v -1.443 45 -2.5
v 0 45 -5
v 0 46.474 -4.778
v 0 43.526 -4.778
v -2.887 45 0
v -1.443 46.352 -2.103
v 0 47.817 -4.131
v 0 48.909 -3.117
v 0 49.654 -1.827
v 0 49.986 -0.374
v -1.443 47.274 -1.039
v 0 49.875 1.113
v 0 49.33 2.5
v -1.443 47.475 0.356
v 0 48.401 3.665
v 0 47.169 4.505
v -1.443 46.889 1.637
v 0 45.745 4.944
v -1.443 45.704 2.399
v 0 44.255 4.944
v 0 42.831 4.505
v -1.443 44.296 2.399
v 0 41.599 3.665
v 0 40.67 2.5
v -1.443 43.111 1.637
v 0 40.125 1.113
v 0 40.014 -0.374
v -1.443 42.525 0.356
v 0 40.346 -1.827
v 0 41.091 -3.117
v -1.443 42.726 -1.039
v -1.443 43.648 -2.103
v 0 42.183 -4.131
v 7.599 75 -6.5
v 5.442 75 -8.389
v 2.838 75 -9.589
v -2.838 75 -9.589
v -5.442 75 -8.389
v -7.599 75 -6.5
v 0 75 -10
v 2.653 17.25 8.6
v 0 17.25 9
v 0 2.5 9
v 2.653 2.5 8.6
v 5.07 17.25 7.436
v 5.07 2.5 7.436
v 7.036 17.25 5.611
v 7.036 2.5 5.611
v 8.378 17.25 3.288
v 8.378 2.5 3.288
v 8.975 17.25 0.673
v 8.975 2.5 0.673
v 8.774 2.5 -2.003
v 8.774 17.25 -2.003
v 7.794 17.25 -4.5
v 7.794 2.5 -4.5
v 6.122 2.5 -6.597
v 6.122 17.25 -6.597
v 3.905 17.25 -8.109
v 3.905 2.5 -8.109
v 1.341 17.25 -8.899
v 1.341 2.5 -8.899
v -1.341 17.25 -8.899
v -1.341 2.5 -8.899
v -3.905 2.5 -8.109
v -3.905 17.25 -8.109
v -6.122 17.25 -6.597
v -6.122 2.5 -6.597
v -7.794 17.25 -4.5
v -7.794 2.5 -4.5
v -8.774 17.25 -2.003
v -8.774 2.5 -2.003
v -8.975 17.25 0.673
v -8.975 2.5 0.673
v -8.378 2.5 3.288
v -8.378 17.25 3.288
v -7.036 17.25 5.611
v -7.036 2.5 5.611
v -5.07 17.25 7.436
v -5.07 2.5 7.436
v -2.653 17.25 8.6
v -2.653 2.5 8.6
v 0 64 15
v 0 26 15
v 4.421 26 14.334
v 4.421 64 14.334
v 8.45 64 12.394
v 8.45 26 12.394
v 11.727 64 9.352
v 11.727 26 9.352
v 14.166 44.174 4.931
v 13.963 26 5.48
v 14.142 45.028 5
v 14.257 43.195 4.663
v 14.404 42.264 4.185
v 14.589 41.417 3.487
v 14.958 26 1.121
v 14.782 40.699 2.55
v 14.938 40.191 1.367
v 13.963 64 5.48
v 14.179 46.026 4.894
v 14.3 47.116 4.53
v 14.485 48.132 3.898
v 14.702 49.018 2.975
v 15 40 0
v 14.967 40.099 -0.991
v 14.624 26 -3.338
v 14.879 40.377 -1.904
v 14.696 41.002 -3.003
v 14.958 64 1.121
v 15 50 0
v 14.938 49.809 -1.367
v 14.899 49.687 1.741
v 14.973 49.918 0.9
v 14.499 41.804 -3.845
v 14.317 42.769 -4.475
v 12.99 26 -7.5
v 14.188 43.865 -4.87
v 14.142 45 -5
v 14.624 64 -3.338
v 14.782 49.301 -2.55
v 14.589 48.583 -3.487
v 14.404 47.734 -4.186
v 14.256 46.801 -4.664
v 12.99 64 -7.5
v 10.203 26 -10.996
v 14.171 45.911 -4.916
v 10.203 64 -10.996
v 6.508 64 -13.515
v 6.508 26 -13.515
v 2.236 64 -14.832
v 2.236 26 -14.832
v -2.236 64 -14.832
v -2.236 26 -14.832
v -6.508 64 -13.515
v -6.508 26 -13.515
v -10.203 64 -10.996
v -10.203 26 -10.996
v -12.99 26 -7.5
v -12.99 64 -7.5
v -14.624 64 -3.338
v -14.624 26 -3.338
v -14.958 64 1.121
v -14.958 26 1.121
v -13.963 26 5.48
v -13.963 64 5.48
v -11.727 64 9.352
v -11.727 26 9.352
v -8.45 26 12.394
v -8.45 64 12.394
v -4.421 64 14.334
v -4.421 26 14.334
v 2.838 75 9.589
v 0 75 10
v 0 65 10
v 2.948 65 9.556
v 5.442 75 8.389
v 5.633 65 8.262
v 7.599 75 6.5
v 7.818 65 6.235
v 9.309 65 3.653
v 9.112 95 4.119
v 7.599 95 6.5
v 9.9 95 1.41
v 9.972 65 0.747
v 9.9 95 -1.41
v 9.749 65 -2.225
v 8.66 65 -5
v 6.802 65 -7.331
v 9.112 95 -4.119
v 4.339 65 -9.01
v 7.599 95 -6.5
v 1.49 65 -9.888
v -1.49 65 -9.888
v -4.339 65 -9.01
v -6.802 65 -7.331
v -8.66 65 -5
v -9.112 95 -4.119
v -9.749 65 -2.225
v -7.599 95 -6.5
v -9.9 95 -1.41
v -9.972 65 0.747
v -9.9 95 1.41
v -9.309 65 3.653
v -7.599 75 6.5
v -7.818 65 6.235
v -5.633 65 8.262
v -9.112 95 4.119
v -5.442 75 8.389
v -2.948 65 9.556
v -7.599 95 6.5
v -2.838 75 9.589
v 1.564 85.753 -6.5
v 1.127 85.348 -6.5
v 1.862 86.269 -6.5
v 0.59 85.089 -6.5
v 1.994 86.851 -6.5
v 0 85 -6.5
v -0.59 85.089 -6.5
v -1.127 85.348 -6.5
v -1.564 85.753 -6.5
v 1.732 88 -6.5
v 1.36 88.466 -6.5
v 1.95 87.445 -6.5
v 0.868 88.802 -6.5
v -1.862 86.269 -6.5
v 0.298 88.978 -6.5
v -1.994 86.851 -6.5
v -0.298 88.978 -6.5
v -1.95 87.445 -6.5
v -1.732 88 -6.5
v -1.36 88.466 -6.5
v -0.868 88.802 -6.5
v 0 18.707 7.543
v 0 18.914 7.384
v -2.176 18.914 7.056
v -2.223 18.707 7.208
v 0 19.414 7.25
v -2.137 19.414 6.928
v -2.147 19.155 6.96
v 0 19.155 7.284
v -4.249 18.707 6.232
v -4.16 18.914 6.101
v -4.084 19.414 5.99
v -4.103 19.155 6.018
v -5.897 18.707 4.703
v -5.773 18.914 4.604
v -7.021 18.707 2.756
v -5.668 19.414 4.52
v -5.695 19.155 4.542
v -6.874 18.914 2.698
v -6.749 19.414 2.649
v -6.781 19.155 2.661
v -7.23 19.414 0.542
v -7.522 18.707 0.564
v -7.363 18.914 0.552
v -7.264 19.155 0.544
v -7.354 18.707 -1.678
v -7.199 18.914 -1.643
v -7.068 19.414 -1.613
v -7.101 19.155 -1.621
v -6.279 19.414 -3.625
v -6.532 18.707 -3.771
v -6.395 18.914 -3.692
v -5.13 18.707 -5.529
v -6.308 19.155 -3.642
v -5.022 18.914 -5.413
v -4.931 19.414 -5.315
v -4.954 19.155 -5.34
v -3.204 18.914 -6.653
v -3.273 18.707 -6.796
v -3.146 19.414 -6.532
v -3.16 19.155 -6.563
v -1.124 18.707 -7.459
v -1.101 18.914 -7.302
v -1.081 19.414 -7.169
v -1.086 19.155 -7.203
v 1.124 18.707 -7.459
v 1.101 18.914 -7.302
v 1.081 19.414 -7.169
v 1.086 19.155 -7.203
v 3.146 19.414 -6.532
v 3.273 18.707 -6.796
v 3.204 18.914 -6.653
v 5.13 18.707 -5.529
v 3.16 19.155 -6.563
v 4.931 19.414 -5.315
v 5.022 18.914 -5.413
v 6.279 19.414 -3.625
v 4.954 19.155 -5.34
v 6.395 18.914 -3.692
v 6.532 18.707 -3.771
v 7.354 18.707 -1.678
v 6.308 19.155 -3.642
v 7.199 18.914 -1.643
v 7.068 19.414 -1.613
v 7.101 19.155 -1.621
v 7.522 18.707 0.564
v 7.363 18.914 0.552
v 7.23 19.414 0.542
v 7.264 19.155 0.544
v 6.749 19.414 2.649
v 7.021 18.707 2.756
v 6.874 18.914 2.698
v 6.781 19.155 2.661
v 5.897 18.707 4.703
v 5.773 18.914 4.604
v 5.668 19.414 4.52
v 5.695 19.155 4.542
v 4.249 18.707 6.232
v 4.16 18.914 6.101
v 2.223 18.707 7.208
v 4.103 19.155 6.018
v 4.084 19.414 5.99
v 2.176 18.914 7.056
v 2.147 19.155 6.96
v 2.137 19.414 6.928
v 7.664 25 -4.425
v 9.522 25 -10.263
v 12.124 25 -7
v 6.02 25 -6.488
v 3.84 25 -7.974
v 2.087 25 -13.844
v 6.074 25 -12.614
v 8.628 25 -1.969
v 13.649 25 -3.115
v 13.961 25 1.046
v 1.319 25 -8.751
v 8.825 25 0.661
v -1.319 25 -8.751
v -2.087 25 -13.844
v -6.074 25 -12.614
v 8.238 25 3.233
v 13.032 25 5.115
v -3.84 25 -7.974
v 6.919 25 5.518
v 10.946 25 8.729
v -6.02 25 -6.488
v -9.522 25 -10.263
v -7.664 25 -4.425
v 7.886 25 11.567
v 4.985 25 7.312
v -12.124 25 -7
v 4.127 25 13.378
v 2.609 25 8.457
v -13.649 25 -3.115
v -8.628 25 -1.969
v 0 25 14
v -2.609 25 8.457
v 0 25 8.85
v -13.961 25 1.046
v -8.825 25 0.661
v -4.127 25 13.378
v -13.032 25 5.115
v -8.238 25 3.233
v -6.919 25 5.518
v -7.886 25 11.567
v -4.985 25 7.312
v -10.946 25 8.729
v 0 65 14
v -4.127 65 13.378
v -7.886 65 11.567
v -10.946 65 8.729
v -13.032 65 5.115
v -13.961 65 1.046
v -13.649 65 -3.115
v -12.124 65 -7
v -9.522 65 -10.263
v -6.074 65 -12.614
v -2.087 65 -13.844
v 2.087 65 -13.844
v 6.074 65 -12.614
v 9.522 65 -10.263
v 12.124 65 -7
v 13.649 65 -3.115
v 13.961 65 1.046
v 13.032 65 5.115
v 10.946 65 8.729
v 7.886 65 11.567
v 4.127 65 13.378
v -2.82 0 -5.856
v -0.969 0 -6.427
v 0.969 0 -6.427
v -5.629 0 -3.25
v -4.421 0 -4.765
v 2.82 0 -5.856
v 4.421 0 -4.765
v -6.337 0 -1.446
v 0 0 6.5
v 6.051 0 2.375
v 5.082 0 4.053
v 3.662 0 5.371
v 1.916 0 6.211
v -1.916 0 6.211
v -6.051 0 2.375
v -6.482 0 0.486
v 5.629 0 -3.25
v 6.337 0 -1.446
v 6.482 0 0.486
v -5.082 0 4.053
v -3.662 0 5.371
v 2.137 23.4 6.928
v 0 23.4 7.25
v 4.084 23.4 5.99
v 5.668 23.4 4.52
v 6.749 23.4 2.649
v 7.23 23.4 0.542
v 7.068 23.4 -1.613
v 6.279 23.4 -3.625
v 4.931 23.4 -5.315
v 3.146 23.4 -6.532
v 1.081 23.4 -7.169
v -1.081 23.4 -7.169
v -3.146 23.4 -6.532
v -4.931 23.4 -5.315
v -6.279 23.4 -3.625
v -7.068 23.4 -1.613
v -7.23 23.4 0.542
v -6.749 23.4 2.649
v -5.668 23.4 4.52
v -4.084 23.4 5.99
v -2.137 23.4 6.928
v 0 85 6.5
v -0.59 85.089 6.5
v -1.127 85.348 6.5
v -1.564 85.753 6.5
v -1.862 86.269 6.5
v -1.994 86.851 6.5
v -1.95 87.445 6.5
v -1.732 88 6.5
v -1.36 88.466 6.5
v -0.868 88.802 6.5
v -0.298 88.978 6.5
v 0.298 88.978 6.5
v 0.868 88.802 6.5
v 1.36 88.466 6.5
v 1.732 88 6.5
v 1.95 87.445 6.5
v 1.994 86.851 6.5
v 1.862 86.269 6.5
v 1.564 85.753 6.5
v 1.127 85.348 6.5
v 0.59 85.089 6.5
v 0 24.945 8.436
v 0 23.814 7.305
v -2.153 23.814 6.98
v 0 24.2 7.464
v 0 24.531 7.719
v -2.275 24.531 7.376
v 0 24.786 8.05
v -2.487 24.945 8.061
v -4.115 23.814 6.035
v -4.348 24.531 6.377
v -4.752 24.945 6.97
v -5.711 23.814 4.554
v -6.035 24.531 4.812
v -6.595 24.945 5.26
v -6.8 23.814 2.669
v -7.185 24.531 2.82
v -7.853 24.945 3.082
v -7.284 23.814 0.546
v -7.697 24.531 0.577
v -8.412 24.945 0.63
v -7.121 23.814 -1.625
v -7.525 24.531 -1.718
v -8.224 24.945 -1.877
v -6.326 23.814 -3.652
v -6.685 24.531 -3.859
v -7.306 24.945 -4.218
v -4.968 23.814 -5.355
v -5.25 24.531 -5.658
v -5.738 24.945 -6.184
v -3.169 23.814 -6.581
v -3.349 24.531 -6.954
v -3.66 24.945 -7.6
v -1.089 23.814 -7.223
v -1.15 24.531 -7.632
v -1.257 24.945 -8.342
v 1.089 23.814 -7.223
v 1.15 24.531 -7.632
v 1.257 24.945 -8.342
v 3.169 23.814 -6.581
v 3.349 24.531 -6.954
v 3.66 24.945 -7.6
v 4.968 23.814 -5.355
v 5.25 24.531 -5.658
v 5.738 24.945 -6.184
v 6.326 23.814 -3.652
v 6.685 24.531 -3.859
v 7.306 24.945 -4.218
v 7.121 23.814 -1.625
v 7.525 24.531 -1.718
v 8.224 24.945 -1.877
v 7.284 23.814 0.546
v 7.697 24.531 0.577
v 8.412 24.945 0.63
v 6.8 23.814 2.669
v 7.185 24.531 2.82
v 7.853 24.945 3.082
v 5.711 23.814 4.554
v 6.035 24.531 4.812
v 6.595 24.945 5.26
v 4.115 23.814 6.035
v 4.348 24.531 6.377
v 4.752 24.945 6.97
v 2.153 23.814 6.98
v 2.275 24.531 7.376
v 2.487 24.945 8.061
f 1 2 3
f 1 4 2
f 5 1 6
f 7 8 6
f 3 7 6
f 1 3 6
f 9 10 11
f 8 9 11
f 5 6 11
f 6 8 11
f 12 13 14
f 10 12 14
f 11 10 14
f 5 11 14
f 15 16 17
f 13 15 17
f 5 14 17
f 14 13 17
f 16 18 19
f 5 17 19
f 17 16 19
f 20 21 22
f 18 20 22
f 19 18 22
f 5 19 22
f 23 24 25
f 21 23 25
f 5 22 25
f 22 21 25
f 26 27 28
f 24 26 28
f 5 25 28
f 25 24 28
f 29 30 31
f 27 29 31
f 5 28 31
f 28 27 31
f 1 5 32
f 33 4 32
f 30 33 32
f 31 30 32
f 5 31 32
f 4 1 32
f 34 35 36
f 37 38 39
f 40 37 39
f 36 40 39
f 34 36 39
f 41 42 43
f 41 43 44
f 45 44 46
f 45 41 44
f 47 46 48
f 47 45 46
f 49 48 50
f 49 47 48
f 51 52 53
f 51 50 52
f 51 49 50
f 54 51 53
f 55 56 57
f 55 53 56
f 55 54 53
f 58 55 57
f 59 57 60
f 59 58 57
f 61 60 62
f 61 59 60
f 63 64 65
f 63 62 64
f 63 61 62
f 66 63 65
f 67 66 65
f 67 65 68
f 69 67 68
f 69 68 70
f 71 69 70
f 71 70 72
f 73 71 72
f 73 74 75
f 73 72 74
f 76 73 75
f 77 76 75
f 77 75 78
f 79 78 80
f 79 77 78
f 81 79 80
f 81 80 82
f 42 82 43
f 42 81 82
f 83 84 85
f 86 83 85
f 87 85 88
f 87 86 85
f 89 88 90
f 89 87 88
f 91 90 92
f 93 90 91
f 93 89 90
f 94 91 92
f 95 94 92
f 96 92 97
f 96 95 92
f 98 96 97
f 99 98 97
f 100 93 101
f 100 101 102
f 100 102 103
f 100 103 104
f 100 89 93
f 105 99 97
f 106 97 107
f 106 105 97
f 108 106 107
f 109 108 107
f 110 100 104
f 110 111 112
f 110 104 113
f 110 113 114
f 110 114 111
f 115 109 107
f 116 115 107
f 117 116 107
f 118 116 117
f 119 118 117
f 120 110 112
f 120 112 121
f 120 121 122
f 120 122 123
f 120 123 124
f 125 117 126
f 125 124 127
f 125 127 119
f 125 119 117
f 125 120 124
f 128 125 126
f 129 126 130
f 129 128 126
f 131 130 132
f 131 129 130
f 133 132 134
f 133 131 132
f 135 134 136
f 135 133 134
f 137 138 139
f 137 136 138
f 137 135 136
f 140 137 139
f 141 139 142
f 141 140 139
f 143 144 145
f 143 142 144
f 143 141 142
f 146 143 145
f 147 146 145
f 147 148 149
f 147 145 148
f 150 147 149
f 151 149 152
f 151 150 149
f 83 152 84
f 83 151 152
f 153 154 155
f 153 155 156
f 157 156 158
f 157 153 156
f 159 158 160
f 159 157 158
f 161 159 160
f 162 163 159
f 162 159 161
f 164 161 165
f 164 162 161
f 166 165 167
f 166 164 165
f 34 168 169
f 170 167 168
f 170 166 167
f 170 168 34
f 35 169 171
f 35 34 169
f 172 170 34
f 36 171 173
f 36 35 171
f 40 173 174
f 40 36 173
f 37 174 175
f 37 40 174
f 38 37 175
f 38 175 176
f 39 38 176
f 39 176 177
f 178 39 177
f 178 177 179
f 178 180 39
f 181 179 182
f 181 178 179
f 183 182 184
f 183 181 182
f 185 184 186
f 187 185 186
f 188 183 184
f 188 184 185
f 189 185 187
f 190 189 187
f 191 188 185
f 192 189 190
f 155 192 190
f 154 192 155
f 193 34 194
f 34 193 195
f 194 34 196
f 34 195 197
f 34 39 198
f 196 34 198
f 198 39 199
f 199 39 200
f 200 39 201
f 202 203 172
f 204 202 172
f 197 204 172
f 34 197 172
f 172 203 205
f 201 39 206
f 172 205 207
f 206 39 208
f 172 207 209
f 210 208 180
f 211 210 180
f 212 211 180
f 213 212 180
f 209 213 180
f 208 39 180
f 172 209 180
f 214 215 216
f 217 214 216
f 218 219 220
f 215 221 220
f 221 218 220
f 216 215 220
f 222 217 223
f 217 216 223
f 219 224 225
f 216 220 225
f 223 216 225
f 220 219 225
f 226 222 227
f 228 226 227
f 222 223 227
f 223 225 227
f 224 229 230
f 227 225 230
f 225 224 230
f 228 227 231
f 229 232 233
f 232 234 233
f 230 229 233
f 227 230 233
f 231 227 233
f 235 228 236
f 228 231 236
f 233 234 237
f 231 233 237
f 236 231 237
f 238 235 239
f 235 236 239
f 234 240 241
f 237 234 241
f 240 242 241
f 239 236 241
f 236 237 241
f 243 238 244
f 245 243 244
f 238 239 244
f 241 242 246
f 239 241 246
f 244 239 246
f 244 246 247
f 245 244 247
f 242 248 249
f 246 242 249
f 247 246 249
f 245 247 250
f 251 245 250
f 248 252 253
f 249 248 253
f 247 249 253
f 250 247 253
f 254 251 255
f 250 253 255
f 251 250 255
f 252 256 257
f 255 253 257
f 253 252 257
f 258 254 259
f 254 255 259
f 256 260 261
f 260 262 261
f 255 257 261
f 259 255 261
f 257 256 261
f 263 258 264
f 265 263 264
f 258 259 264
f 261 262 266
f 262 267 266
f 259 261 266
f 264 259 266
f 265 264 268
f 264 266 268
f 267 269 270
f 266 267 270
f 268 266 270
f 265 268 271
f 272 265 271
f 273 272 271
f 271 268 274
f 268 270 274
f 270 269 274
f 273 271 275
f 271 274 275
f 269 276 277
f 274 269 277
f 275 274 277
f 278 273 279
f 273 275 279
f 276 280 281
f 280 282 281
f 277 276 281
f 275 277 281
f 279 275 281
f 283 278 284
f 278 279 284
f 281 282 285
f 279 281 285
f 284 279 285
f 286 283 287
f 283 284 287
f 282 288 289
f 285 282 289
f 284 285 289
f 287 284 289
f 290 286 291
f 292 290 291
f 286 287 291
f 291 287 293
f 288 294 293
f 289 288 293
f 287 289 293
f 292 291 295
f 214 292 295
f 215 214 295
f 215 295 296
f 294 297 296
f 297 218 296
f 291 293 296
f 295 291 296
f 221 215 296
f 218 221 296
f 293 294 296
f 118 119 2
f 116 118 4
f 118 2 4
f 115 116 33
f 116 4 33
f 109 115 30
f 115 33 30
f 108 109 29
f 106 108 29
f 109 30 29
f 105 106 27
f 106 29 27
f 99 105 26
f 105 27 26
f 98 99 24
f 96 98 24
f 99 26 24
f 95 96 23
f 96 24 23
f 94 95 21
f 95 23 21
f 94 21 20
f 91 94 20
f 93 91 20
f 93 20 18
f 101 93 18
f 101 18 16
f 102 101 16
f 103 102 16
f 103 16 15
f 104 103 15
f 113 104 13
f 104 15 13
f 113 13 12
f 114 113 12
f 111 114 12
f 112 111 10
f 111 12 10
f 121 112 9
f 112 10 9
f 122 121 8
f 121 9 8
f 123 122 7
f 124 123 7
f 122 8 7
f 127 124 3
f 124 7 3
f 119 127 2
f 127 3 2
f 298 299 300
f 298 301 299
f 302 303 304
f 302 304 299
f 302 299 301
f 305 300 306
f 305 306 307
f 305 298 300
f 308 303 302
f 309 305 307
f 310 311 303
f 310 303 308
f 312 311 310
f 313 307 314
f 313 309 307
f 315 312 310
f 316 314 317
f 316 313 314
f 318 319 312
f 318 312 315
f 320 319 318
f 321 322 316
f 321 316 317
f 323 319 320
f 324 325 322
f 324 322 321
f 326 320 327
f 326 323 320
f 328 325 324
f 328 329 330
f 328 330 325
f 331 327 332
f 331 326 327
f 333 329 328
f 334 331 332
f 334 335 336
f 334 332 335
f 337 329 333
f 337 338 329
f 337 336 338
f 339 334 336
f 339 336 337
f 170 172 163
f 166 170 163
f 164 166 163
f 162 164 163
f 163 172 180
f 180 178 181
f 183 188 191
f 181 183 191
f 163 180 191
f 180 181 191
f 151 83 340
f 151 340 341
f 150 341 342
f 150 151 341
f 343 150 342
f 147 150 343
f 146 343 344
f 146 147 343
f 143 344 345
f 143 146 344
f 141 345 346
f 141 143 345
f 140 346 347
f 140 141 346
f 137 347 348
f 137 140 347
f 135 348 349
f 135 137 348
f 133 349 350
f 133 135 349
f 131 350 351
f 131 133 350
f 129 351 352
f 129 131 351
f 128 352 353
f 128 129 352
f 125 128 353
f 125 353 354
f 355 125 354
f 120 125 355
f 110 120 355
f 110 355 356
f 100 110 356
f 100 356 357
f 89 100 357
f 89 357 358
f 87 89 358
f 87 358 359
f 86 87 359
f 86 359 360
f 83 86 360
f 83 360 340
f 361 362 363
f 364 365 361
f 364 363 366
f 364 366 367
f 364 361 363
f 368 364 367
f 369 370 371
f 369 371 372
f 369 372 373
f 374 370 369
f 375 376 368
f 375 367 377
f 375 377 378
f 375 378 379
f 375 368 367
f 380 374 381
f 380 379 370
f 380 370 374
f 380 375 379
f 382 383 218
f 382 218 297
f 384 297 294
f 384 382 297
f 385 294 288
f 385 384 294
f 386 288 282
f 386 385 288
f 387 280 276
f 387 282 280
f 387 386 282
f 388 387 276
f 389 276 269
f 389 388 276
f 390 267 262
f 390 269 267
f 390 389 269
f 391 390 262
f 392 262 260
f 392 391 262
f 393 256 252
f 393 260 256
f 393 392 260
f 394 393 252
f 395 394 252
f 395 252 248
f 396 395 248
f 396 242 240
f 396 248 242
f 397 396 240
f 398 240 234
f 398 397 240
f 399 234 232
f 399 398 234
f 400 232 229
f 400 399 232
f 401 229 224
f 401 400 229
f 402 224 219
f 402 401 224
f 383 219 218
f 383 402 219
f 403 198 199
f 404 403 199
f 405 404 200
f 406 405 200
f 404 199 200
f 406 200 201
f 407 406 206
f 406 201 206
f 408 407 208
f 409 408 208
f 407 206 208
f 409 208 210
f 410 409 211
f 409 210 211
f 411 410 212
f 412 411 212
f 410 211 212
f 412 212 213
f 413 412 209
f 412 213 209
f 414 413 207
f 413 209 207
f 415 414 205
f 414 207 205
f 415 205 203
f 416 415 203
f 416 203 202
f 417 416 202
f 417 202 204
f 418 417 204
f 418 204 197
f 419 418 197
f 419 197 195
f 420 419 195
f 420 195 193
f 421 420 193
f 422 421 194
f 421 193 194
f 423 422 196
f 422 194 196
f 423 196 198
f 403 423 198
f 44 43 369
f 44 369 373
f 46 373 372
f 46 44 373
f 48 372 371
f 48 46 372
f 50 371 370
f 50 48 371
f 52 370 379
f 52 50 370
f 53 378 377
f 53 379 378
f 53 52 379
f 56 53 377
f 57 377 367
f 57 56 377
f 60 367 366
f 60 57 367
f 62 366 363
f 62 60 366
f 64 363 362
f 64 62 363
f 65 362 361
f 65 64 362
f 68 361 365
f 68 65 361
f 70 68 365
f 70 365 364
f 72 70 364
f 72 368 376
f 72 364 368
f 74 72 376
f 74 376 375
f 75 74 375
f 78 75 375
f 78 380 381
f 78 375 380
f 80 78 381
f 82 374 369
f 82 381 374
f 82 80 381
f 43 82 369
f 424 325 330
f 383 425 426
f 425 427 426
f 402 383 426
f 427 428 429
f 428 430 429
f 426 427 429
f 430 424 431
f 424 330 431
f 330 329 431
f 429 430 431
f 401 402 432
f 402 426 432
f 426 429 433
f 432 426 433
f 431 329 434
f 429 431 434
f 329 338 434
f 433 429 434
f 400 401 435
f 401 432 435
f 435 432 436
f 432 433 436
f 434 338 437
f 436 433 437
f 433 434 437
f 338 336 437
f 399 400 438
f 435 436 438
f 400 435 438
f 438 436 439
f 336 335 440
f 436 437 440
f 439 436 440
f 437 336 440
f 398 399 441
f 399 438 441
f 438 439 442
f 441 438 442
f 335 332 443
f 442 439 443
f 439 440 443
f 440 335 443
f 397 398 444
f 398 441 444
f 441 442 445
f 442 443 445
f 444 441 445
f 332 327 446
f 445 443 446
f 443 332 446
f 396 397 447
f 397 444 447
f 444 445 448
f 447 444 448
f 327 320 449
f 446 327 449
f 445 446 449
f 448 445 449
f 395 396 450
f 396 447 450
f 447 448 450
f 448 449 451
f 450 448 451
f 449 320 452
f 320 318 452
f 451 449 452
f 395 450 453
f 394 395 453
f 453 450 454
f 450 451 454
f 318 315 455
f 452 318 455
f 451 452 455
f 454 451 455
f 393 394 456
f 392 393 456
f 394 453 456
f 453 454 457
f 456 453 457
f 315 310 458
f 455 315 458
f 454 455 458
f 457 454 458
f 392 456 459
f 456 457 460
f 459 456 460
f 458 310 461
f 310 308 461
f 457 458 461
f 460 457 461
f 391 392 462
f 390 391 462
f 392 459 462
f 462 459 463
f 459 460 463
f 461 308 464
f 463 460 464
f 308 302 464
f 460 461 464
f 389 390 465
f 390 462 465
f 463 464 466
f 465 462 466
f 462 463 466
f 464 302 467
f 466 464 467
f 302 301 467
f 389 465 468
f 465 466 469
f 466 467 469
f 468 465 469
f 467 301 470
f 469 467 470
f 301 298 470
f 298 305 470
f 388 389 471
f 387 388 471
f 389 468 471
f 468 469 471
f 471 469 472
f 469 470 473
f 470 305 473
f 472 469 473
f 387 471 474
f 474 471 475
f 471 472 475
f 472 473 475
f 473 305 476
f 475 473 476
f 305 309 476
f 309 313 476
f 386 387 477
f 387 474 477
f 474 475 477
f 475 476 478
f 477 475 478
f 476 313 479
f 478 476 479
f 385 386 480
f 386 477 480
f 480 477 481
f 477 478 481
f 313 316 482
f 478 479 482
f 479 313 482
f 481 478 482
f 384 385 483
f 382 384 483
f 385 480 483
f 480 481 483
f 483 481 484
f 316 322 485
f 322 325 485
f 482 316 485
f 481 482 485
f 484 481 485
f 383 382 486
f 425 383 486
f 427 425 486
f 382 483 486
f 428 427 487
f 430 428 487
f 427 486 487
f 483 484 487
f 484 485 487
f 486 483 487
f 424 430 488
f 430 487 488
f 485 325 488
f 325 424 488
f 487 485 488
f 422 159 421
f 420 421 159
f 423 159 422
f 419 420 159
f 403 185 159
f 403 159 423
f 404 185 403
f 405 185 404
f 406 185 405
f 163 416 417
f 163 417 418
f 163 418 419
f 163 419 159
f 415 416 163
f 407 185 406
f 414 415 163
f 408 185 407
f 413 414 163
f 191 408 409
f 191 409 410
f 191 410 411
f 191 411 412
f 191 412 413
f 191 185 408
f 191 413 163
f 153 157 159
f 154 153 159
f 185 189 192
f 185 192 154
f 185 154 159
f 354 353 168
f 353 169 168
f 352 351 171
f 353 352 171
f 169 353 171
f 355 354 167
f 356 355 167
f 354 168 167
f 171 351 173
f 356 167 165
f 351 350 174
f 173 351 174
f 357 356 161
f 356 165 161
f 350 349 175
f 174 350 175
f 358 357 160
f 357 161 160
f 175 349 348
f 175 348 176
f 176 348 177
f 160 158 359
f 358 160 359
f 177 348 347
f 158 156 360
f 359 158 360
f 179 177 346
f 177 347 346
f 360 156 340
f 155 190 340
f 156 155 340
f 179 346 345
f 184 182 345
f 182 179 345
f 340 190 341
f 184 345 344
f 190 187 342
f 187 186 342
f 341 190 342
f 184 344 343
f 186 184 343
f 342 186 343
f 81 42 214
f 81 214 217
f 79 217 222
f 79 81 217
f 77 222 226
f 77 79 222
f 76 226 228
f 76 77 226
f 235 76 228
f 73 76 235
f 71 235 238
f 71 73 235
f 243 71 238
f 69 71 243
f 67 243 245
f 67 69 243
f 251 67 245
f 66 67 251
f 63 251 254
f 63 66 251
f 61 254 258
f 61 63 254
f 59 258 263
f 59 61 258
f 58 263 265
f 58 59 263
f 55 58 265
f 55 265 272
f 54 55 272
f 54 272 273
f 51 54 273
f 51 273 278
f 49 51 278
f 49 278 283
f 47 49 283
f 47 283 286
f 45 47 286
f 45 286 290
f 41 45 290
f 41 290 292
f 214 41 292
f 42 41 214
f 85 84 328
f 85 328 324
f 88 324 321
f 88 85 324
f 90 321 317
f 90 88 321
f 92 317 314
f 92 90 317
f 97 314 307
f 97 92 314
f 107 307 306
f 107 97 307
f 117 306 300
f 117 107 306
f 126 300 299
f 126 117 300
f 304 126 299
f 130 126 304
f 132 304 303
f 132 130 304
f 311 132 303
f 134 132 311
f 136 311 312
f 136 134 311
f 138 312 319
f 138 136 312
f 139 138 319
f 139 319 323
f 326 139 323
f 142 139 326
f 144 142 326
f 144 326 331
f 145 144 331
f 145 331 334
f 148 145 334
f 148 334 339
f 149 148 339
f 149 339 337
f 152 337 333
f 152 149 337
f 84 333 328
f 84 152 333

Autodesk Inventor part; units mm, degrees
ref_plane "XZ Plane" through (0, 0, 0) normal (0, 1, 0) x (-1, 0, 0)
ref_plane "XY Plane" through (0, 0, 0) normal (0, 0, 1) x (1, 0, 0)
sketch "Эскиз1" plane through (0, 0, 0) normal (1, 0, 0) x (0, 1, 0)
  line L0 (0, 0) -> (0, 9)
  line L1 (0, 9) -> (17.25, 9)
  line L2 (17.25, 9) -> (18.7071, 7.5429)
  line L3 (19.4142, 7.25) -> (23.4, 7.25)
  line L4 (25, 8.85) -> (25, 15)
  line L5 (25, 15) -> (65, 15)
  line L6 (65, 15) -> (65, 10)
  line L7 (65, 10) -> (95, 10)
  line L8 (95, 0) -> (0, 0)
  line L9 (95, 10) -> (95, 0)
  arc A0 (18.7071, 7.5429) -> (19.4142, 7.25) centre (19.4142, 8.25) ccw
  arc A1 (23.4, 7.25) -> (25, 8.85) centre (23.4, 8.85) ccw
  point P0 (19, 7.25)
  point P1 (25, 7.25)
  dimension "d0" = 95
  dimension "d1" = 18
  dimension "d2" = 14.5
  dimension "d3" = 45
  dimension "d4" = 40
  dimension "d5" = 25
  dimension "d6" = 6
  dimension "d7" = 20
  dimension "d8" = 30
  dimension "d9" = 1
  dimension "d10" = 1.6
revolve "Вращение1" add sketch "Эскиз1" angle 360 about axis through (0, 95, 0) along (0, -1, 0)
thread "Резьба1" size "M18x2.5" designation "M18" class "6g" standard "GB Metric profile" full length
chamfer "Фаска1" distance 2.5 angle 45 1 edges at (0, 0, -9)
chamfer "Фаска2" distance 1 angle 45 2 edges at (0, 25, -15) (0, 65, -15)
ref_plane "РабПлоскость1" through (15, 0, 0) normal (1, 0, 0) x (0, 1, 0)
sketch "Эскиз2" plane through (15, 0, 0) normal (1, 0, 0) x (0, 1, 0)
  line L0 (25, -14) -> (25, 14) projected
  point P0 (0, 0)
  point P1 (45, 0)
  dimension "d21" = 20
hole "Отверстие1" at (15, 45, 0) direction (-1, 0, 0) diameter 10 depth 15 tip angle 120
sketch "Эскиз3" plane through (0, 0, 0) normal (1, 0, 0) x (0, 1, 0)
  line L0 (95, 10) -> (75, 10)
  line L1 (75, 10) -> (75, 6.5)
  line L2 (75, 6.5) -> (95, 6.5)
  line L3 (95, 6.5) -> (95, 10)
  line L4 (-19.7495, 0) -> (118.4967, 0) projected
  line L5 (95, -10) -> (95, 10) projected
  line L6 (65, 10) -> (95, 10) projected
  line L7 (-19, 0) -> (114, 0) projected
  line L8 (95, -10) -> (75, -10)
  line L9 (75, -10) -> (75, -6.5)
  line L10 (75, -6.5) -> (95, -6.5)
  line L11 (95, -6.5) -> (95, -10)
  point P0 (0, 0)
  dimension "d29" = 6.5
  dimension "d30" = 20
extrude "Выдавливание1" cut sketch "Эскиз3" along normal through all both and the other way through all
sketch "Эскиз4" plane through (-7.5993, 95, 6.5) normal (0, 0, 1) x (1, 0, 0)
  line L0 (0, 0) -> (15.1987, 0) projected
  line L1 (-2.4007, -30) -> (-2.4007, 0) projected
  point P0 (7.5993, -95)
  point P1 (7.5993, -8)
  dimension "d33" = 10
  dimension "d34" = 8
hole "Отверстие2" at (0, 87, 6.5) direction (0, 0, -1) diameter 4 end through all
properties part number "Вал_19"
